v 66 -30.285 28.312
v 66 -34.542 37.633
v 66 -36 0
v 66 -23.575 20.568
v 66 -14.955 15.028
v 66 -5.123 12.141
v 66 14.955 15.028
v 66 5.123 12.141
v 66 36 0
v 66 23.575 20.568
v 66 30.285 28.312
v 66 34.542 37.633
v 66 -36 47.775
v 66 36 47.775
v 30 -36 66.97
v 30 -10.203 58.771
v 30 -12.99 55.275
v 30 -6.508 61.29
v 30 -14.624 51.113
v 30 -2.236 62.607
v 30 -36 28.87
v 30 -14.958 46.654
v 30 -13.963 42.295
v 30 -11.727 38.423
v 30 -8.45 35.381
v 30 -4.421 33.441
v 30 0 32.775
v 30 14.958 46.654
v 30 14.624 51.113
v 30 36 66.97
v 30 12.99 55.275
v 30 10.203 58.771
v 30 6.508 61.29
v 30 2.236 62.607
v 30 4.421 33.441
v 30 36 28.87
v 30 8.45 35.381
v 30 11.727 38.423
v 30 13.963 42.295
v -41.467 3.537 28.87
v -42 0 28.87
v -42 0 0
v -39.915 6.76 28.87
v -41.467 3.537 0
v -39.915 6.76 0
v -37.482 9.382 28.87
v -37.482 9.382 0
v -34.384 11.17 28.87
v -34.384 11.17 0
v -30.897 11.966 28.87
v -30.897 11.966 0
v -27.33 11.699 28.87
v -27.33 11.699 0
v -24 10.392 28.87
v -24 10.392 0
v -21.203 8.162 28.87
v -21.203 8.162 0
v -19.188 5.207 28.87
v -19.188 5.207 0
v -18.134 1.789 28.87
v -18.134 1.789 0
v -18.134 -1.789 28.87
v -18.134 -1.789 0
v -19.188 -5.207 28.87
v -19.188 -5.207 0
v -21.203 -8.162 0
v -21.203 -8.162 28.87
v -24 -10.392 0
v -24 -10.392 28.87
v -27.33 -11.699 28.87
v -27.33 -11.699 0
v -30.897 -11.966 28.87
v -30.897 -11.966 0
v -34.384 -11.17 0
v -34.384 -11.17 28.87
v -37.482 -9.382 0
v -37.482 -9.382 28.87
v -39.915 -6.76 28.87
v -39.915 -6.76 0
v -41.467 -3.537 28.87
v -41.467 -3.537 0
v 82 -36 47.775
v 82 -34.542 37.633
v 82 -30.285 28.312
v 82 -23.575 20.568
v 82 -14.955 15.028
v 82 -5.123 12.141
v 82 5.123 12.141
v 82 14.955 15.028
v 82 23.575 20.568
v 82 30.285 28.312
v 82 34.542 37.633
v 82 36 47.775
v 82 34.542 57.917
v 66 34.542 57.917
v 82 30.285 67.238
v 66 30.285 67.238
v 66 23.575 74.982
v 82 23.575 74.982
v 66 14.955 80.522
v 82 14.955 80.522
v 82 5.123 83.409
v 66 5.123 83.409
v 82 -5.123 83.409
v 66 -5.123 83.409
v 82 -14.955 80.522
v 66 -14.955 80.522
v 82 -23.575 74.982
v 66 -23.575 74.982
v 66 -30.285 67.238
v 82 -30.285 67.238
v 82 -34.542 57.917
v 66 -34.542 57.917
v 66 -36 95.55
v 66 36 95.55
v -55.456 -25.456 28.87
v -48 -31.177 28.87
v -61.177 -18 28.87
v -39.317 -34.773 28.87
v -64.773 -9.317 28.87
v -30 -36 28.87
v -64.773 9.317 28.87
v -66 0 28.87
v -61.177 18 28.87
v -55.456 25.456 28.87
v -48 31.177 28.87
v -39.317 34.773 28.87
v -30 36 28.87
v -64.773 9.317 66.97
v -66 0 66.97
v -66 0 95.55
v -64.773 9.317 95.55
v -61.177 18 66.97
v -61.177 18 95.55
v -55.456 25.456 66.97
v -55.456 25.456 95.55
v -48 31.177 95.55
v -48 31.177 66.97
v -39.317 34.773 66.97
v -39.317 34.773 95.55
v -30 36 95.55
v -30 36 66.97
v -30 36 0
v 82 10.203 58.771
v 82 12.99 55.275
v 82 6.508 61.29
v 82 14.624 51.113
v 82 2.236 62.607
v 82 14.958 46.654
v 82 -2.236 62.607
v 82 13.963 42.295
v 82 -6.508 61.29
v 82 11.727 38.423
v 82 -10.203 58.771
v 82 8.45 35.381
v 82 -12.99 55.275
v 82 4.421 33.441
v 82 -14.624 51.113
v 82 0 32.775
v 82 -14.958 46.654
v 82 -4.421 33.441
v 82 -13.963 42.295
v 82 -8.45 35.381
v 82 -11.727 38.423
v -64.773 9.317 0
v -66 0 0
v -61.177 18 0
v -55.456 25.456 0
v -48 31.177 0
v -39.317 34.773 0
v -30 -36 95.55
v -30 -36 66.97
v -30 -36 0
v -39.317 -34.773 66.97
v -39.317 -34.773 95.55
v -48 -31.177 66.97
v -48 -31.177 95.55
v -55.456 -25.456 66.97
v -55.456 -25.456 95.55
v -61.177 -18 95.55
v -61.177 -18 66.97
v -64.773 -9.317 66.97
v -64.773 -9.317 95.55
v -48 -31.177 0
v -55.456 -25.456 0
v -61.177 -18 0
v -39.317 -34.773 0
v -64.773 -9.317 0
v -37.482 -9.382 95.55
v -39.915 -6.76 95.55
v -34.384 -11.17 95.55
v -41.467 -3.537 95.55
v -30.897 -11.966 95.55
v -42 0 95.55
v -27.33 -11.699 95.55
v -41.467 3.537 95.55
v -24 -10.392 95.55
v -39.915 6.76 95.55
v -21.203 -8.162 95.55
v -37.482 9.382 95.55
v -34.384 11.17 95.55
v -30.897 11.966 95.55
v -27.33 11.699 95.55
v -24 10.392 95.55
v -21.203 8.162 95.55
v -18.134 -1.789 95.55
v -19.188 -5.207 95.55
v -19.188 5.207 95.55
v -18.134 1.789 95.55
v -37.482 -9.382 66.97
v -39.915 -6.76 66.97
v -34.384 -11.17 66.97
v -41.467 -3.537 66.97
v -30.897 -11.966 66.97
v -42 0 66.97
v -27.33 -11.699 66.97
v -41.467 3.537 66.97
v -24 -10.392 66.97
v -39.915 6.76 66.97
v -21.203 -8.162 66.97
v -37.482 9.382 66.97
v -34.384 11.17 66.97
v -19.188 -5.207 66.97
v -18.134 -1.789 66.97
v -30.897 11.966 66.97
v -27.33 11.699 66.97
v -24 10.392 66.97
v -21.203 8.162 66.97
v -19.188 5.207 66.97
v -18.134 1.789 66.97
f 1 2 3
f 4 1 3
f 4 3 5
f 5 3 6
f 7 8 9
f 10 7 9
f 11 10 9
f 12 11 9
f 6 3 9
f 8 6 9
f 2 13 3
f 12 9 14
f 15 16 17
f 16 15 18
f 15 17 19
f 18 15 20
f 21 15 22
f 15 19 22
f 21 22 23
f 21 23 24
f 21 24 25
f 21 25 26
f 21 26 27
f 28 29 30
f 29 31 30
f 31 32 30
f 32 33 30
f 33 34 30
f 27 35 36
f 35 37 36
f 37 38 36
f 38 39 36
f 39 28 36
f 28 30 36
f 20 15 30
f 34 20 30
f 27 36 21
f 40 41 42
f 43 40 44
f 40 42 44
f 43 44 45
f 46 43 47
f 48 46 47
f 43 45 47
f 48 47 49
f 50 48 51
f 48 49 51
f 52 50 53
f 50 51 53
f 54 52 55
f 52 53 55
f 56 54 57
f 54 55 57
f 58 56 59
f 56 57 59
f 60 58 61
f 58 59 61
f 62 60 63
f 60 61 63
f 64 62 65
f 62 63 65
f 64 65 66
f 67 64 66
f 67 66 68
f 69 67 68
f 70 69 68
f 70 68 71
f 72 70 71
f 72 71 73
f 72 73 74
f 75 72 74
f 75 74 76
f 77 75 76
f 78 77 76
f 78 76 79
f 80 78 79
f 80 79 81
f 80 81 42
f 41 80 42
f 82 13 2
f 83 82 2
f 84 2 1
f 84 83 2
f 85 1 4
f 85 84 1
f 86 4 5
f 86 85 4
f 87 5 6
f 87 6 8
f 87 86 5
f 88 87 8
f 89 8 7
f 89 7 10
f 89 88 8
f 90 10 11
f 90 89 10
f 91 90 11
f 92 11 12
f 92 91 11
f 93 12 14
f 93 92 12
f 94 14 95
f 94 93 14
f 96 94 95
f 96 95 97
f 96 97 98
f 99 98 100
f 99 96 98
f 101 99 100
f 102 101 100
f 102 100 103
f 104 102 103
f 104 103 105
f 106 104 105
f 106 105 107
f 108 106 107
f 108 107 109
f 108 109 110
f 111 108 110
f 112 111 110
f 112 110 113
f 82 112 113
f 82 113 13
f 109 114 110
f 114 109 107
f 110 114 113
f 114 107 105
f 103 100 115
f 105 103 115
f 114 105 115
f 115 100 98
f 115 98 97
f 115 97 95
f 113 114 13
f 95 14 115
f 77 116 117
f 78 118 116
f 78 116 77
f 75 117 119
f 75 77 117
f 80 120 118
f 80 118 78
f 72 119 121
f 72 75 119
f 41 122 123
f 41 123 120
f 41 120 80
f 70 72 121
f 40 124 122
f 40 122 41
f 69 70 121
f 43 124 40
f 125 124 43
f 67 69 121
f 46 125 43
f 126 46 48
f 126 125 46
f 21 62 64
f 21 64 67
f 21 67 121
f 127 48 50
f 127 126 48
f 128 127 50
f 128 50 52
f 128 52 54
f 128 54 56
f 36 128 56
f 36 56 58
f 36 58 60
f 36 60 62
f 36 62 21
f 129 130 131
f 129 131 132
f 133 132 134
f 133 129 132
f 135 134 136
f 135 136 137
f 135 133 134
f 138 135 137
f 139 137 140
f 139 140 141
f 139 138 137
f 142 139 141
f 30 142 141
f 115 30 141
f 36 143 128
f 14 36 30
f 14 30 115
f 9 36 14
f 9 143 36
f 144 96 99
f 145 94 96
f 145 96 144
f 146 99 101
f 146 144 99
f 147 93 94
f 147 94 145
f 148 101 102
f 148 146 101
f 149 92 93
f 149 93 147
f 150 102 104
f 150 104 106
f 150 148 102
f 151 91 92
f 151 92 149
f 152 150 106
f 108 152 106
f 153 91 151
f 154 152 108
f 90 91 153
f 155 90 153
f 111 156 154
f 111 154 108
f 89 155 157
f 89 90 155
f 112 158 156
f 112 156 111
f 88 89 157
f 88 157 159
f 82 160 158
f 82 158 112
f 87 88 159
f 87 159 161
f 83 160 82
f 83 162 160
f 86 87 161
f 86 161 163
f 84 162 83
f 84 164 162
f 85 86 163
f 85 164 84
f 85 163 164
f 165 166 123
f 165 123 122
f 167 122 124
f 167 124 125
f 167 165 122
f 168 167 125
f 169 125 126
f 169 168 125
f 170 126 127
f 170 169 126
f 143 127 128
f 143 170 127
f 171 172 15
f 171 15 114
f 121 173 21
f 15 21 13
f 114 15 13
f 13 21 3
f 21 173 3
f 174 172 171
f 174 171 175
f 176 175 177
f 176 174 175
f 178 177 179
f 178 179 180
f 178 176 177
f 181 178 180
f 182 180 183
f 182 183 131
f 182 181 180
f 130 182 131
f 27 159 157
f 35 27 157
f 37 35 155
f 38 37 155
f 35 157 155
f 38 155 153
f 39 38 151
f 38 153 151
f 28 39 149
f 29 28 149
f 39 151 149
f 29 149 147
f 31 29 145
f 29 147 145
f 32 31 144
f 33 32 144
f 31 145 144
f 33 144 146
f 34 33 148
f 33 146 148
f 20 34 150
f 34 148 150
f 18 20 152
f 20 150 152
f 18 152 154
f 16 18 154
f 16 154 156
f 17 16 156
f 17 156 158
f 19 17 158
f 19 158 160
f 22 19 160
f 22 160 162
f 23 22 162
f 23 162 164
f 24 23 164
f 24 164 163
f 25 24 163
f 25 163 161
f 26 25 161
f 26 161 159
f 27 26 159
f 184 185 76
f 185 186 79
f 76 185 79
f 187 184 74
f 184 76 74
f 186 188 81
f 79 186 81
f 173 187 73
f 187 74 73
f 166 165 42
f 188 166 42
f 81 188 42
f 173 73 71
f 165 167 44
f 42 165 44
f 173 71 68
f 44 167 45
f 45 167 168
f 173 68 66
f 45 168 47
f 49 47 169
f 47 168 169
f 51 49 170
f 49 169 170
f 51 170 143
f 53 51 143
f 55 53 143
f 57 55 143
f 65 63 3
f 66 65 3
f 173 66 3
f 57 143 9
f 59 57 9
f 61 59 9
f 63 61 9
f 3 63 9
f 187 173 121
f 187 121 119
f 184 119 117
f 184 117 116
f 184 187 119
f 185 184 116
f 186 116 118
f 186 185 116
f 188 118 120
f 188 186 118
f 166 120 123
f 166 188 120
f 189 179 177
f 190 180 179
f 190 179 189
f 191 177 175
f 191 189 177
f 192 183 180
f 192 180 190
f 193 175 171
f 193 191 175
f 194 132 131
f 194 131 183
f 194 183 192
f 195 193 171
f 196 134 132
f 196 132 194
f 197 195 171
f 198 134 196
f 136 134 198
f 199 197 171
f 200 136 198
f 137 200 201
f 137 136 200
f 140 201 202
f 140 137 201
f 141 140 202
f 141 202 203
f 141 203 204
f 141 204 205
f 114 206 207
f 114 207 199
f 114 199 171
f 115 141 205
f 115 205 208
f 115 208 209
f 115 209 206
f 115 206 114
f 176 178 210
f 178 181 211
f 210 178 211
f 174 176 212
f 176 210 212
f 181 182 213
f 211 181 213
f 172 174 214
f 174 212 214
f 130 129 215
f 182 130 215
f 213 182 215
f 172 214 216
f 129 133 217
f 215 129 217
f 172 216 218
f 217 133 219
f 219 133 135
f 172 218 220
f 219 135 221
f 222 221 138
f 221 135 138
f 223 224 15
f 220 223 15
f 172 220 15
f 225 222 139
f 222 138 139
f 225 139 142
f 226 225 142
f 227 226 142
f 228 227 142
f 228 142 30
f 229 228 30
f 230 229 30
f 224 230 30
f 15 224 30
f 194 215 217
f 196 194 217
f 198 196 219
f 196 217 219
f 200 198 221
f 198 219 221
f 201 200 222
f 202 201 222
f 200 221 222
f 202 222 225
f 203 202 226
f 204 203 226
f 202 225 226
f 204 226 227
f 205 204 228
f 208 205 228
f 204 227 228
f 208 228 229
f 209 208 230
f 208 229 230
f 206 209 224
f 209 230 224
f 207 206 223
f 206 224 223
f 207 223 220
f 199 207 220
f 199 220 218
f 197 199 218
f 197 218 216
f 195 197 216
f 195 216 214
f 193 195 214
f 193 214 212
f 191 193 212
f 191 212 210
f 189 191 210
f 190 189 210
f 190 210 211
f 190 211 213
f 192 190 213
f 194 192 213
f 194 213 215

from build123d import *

# Parameters (mm, degrees)
SKETCH1_W           = 132
SKETCH1_H           = 72
BOSS_EXTRUDE1_DEPTH = 95.55
CUT_EXTRUDE3_START  = -95.55
CUT_EXTRUDE3_DEPTH  = 95.55
SKETCH3_W           = 96
SKETCH3_H           = 38.1
CUT_EXTRUDE4_DEPTH  = 137.637485706
SKETCH4_R           = 15
CUT_EXTRUDE5_DEPTH  = 167.88260095
BOSS_EXTRUDE2_START = 16
SKETCH5_R           = 36
SKETCH5_R_2         = 15
BOSS_EXTRUDE2_DEPTH = 16
SKETCH6_R           = 12
CUT_EXTRUDE6_DEPTH  = 131.957254476


# Read off the part's stored shape, not the designer's step: Cut-Extrude3
with BuildPart() as part:
    # Sketch1 → Boss-Extrude1 (new body)
    with BuildSketch(Plane.XY):
        Rectangle(SKETCH1_W, SKETCH1_H)
    extrude(amount=BOSS_EXTRUDE1_DEPTH)

    # Cut-Extrude3 outline → Cut-Extrude3 (cut)
    with BuildSketch(Plane.XY.offset(95.55).offset(CUT_EXTRUDE3_START)):
        with BuildLine():
            Line((-66, -36), (-30, -36))
            ThreePointArc((-30, -36), (-55.455844123, -25.455844123), (-66, 0))
            Line((-66, 0), (-66, -36))
        make_face()
        with BuildLine():
            Line((-66, 36), (-66, 0))
            ThreePointArc((-66, 0), (-55.455844123, 25.455844123), (-30, 36))
            Line((-30, 36), (-66, 36))
        make_face()
    extrude(amount=CUT_EXTRUDE3_DEPTH, mode=Mode.SUBTRACT)

    # Sketch3 → Cut-Extrude4 (cut, through all)
    with BuildSketch(Plane(origin=(0, 36, 0), x_dir=(1, 0, 0), z_dir=(0, 1, 0))):
        with Locations((-18, -47.92)):
            Rectangle(SKETCH3_W, SKETCH3_H)
    extrude(amount=-CUT_EXTRUDE4_DEPTH, mode=Mode.SUBTRACT)

    # Sketch4 → Cut-Extrude5 (cut, through all)
    with BuildSketch(Plane(origin=(66, 0, 0), x_dir=(0, 0, -1), z_dir=(1, 0, 0))):
        with Locations((-47.775, 0)):
            Circle(SKETCH4_R)
    extrude(amount=-CUT_EXTRUDE5_DEPTH, mode=Mode.SUBTRACT)

    # Sketch5 → Boss-Extrude2 (add)
    with BuildSketch(Plane(origin=(66, 0, 0), x_dir=(0, 0, -1), z_dir=(1, 0, 0)).offset(BOSS_EXTRUDE2_START)):
        with Locations(Location((-47.775, 0, 0), (0, 0, 270))):
            Circle(SKETCH5_R)
        with Locations((-47.775, 0)):
            Circle(SKETCH5_R_2, mode=Mode.SUBTRACT)
    extrude(amount=-BOSS_EXTRUDE2_DEPTH)

    # Sketch6 → Cut-Extrude6 (cut, through all)
    with BuildSketch(Plane(origin=(0, 0, 0), x_dir=(-1, 0, 0), z_dir=(0, 0, -1))):
        with Locations((30, 0)):
            Circle(SKETCH6_R)
    extrude(amount=-CUT_EXTRUDE6_DEPTH, mode=Mode.SUBTRACT)


solid = part.part
